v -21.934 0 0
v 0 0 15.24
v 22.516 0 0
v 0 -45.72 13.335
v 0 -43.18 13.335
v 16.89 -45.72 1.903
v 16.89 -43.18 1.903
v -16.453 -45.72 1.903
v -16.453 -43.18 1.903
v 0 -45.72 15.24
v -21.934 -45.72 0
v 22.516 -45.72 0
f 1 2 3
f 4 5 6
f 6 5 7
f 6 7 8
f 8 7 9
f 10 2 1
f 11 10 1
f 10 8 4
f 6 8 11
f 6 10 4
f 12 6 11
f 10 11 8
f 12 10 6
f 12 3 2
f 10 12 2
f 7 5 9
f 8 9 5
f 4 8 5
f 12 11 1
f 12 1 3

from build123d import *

# Parameters (mm, degrees)
F1_DEPTH = 45.72
F2_DEPTH = 43.18


with BuildPart() as f1:
    # F0 (on Front) → F1 (new body)
    with BuildSketch(Plane.XZ):
        Polygon((0, 15.24), (-21.933843, 0), (0, 0), (0, 1.903249), (-16.452903, 1.903249), (0, 13.335), align=None)
        Polygon((0, 1.903249), (0, 0), (22.516157, 0), (0, 15.24), (0, 13.335), (16.889705, 1.903249), align=None)
    extrude(amount=F1_DEPTH)

    # F0 (on Front) → F2 (join)
    with BuildSketch(Plane.XZ):
        Polygon((-16.452903, 1.903249), (0, 1.903249), (16.889705, 1.903249), (0, 13.335), align=None)
    extrude(amount=F2_DEPTH)


solid = f1.part
